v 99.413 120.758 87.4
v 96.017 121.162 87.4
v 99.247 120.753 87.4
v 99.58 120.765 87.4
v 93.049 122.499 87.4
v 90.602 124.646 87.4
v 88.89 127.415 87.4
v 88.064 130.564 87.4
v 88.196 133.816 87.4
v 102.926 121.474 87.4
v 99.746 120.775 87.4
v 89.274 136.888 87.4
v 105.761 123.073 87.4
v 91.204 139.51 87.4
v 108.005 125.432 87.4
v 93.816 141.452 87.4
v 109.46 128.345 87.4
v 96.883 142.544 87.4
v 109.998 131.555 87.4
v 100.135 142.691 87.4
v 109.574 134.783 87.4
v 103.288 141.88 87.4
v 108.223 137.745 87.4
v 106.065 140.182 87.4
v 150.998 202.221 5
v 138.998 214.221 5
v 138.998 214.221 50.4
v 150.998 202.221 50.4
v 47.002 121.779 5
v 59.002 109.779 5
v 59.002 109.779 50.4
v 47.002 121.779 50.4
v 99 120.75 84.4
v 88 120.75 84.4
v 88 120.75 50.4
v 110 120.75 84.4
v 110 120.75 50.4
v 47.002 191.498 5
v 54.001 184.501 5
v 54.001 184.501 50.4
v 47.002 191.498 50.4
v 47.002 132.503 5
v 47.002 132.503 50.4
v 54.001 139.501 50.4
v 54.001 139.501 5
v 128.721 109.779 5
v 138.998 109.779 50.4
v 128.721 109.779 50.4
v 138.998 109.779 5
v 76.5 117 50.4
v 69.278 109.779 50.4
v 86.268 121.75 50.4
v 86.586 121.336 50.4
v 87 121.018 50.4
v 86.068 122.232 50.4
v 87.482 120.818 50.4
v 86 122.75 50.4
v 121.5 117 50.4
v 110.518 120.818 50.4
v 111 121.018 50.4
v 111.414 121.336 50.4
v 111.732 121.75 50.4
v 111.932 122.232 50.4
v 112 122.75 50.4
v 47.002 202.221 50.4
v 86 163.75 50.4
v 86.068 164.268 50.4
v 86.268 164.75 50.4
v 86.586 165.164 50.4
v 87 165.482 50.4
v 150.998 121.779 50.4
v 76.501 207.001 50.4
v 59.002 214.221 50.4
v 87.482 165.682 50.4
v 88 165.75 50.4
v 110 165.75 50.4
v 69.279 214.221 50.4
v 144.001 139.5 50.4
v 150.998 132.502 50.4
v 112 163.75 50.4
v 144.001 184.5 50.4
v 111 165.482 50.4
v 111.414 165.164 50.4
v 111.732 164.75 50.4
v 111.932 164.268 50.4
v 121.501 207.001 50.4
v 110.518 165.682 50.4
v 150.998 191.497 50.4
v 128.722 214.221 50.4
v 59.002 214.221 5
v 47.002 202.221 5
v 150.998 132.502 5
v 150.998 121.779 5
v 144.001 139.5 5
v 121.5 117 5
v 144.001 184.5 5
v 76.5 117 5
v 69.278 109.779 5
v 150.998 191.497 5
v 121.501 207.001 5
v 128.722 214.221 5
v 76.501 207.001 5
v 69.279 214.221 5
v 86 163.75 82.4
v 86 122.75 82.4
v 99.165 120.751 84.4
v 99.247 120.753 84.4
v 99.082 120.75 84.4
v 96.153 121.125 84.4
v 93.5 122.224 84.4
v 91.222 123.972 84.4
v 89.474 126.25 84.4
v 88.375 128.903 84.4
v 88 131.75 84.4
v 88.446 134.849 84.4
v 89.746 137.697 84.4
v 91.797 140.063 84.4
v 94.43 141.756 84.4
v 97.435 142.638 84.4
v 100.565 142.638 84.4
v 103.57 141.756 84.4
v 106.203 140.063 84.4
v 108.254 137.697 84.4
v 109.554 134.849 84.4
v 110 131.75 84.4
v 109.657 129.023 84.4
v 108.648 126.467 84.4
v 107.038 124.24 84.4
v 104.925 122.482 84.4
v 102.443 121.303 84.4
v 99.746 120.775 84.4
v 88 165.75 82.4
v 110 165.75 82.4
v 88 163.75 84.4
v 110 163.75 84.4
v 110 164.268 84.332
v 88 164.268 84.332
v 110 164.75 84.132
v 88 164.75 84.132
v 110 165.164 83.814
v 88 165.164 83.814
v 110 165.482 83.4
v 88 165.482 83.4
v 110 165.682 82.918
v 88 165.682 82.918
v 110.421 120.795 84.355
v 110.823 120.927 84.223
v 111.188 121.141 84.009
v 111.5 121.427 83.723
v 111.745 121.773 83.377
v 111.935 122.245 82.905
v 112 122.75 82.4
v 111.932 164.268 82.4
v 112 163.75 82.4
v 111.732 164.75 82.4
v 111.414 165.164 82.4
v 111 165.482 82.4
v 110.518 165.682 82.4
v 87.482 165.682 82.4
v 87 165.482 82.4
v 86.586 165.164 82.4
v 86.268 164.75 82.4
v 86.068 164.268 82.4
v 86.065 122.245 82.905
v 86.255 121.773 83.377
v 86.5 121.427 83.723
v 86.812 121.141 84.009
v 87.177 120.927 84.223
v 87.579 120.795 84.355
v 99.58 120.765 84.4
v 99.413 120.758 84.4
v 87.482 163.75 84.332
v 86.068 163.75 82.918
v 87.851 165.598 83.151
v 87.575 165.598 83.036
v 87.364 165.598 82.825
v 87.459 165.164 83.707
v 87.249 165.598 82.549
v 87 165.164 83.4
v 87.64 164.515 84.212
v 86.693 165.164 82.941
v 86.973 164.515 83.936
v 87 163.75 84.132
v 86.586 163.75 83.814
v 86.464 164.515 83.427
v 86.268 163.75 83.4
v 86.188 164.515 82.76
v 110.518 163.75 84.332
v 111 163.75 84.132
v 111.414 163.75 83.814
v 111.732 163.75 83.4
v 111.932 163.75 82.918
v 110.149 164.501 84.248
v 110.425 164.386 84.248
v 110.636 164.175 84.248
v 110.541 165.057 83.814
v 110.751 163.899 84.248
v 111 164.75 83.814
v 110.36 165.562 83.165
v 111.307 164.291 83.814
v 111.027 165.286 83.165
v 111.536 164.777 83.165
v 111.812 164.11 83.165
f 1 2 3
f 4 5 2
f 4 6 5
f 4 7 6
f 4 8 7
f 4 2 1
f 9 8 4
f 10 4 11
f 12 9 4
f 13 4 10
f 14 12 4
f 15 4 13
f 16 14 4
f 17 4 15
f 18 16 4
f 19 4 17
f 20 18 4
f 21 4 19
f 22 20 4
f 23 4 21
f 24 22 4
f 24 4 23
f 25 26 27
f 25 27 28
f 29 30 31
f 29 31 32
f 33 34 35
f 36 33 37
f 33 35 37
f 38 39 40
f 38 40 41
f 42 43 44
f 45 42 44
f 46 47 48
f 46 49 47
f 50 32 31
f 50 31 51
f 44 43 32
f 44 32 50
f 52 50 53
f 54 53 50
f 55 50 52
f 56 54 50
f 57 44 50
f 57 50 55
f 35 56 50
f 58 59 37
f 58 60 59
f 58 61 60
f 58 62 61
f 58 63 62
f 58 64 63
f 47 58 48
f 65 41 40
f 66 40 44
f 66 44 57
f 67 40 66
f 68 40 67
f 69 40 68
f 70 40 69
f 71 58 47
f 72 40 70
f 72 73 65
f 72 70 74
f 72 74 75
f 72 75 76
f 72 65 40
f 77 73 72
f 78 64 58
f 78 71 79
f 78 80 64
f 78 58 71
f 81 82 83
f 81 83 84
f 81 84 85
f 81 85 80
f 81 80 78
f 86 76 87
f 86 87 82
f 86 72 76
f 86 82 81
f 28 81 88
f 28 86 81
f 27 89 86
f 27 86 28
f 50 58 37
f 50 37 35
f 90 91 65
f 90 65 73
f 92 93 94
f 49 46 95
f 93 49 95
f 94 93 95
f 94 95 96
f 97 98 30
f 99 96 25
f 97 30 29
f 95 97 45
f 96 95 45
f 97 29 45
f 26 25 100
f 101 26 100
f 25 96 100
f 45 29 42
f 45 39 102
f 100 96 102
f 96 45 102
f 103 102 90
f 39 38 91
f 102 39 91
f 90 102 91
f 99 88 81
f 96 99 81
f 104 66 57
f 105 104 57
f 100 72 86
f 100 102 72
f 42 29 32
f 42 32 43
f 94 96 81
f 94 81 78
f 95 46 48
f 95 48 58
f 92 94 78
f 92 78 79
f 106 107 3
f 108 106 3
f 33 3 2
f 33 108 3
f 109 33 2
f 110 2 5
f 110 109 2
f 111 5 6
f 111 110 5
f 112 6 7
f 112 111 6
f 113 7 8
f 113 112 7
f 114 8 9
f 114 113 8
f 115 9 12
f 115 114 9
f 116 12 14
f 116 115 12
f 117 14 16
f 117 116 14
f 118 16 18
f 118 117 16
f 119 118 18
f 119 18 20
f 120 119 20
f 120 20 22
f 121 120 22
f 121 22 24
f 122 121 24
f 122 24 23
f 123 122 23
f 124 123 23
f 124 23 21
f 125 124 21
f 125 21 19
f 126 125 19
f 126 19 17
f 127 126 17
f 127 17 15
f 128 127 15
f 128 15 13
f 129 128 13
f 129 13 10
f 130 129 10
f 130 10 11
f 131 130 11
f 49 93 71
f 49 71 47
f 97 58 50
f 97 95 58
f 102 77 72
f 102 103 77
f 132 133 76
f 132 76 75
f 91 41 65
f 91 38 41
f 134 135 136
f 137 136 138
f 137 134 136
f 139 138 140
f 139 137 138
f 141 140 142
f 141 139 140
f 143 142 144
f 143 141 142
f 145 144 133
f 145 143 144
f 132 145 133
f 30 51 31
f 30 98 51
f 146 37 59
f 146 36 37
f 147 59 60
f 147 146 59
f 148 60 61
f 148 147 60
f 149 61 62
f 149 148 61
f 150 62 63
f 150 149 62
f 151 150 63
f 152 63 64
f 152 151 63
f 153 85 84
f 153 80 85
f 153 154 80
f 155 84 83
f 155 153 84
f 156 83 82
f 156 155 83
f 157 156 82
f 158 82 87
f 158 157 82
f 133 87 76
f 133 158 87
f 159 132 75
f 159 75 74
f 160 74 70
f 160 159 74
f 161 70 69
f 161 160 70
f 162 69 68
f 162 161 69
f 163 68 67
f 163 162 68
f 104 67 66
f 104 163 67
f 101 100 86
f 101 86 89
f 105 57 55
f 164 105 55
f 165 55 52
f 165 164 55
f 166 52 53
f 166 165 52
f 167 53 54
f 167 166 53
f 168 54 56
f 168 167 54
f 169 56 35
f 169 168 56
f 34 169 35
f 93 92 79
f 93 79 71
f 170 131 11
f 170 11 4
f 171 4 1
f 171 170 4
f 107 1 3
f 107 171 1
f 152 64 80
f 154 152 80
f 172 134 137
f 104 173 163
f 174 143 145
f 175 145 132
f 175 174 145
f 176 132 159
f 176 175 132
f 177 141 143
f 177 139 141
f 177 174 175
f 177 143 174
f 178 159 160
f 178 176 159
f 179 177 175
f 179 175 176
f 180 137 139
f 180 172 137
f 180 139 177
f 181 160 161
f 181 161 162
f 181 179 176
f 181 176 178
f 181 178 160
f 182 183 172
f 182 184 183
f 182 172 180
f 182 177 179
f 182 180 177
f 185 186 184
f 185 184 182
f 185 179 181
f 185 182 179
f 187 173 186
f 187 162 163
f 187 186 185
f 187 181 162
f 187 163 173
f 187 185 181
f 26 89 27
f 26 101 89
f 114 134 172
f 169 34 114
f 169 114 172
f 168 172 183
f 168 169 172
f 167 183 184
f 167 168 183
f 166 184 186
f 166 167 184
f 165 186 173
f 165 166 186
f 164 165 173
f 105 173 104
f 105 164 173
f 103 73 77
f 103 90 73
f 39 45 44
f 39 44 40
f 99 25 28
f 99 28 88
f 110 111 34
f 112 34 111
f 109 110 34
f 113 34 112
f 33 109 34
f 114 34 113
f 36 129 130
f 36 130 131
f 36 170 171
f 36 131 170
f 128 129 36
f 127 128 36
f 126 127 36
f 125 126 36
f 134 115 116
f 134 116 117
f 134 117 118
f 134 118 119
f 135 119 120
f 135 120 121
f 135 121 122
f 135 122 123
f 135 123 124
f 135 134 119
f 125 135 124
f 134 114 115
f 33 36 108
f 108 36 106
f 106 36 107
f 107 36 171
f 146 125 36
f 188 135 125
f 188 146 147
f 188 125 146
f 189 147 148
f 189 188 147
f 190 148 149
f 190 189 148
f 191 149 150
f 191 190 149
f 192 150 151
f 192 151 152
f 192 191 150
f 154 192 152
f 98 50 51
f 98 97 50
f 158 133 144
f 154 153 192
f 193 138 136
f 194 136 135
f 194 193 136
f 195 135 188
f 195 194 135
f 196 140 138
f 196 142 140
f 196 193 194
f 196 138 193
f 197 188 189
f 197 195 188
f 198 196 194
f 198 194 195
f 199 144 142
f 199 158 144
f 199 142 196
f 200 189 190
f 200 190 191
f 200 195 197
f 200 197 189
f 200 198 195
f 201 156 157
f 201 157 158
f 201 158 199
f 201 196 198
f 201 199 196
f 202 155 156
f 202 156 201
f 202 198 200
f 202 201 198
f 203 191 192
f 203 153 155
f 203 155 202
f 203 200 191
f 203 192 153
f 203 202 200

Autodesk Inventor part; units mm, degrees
ref_plane "YZ Plane" through (0, 0, 0) normal (1, 0, 0) x (0, 1, 0)
ref_plane "XZ Plane" through (0, 0, 0) normal (0, 1, 0) x (-1, 0, 0)
ref_plane "XY Plane" through (0, 0, 0) normal (0, 0, 1) x (1, 0, 0)
sketch "Sketch1" plane through (0, 0, 0) normal (0, 0, 1) x (1, 0, 0)
  line L0 (87.39809, 90.638849) -> (76.791489, 101.245451)
  line L1 (110.603697, 90.638591) -> (87.39809, 90.638849)
  line L2 (121.210063, 101.244956) -> (110.603697, 90.638591)
  line L3 (143.419374, 101.244709) -> (121.210063, 101.244956)
  line L4 (153.419263, 111.244598) -> (143.419374, 101.244709)
  line L5 (153.419473, 130.081843) -> (153.419263, 111.244598)
  line L6 (144.001258, 139.500058) -> (153.419473, 130.081843)
  line L7 (144.001258, 184.500058) -> (144.001258, 139.500058)
  line L8 (162.838724, 203.336883) -> (144.001258, 184.500058)
  line L9 (174.479779, 203.336684) -> (162.838724, 203.336883)
  line L10 (188.623093, 217.476415) -> (174.479779, 203.336684)
  line L11 (188.623904, 237.476415) -> (188.623093, 217.476415)
  line L12 (174.481567, 251.622561) -> (188.623904, 237.476415)
  line L13 (154.481567, 251.622902) -> (174.481567, 251.622561)
  line L14 (140.33919, 237.481007) -> (154.481567, 251.622902)
  line L15 (140.338992, 225.83779) -> (140.33919, 237.481007)
  line L16 (121.502223, 207.001664) -> (140.338992, 225.83779)
  line L17 (76.502223, 207.001664) -> (121.502223, 207.001664)
  line L18 (57.665842, 225.839164) -> (76.502223, 207.001664)
  line L19 (57.66604, 237.480627) -> (57.665842, 225.839164)
  line L20 (43.524145, 251.623004) -> (57.66604, 237.480627)
  line L21 (23.524145, 251.623344) -> (43.524145, 251.623004)
  line L22 (9.381769, 237.48145) -> (23.524145, 251.623344)
  line L23 (9.380958, 217.48145) -> (9.381769, 237.48145)
  line L24 (23.52252, 203.338741) -> (9.380958, 217.48145)
  line L25 (35.165328, 203.338269) -> (23.52252, 203.338741)
  line L26 (54.001421, 184.501058) -> (35.165328, 203.338269)
  line L27 (54.001421, 139.501058) -> (54.001421, 184.501058)
  line L28 (44.582671, 130.082867) -> (54.001421, 139.501058)
  line L29 (44.582461, 111.245809) -> (44.582671, 130.082867)
  line L30 (54.582226, 101.245698) -> (44.582461, 111.245809)
  line L31 (76.791489, 101.245451) -> (54.582226, 101.245698)
  circle A0 centre (99, 132) radius 5.5
  arc A1 (130.06, 142) -> (135.06, 142) centre (132.56, 142) ccw
  line L32 (130.06, 142) -> (130.06, 182)
  line L33 (135.06, 182) -> (135.06, 142)
  arc A2 (62.940969, 142) -> (67.940969, 142) centre (65.440969, 142) ccw
  arc A3 (67.940969, 182) -> (62.940969, 182) centre (65.440969, 182) ccw
  line L34 (67.940969, 182) -> (67.940969, 142)
  line L35 (138.997508, 214.221497) -> (150.997508, 202.221497)
  line L36 (128.721743, 214.221497) -> (138.997508, 214.221497)
  line L37 (121.5, 207) -> (128.721743, 214.221497)
  line L38 (76.5, 207) -> (121.5, 207)
  line L39 (69.278592, 214.221497) -> (76.5, 207)
  line L40 (59.002492, 214.221497) -> (69.278592, 214.221497)
  line L41 (47.002492, 202.221497) -> (59.002492, 214.221497)
  line L42 (47.002492, 191.497594) -> (47.002492, 202.221497)
  line L43 (54, 184.5) -> (47.002492, 191.497594)
  line L44 (54, 139.5) -> (54, 184.5)
  line L45 (47.002492, 132.502579) -> (54, 139.5)
  line L46 (47.002492, 121.778503) -> (47.002492, 132.502579)
  line L47 (59.002492, 109.778503) -> (47.002492, 121.778503)
  line L48 (69.278414, 109.778503) -> (59.002492, 109.778503)
  line L49 (76.5, 117) -> (69.278414, 109.778503)
  line L50 (121.5, 117) -> (76.5, 117)
  line L51 (128.721408, 109.778503) -> (121.5, 117)
  line L52 (138.997508, 109.778503) -> (128.721408, 109.778503)
  line L53 (150.997508, 121.778503) -> (138.997508, 109.778503)
  line L54 (150.997508, 132.502406) -> (150.997508, 121.778503)
  line L55 (144, 139.5) -> (150.997508, 132.502406)
  line L56 (144, 184.5) -> (144, 139.5)
  line L57 (150.997508, 191.497269) -> (144, 184.5)
  line L58 (150.997508, 202.221497) -> (150.997508, 191.497269)
  arc A4 (99.74629, 120.775345) -> (99.246799, 120.752769) centre (99, 131.75) ccw
  line L59 (111.585786, 133.75) -> (111, 133.75)
  line L60 (111.585786, 133.75) -> (111.585786, 135.25)
  line L61 (111.585786, 135.25) -> (113.5, 135.25)
  line L62 (113.5, 135.45) -> (113.5, 135.25)
  line L63 (113.5, 135.45) -> (113.917157, 135.45)
  line L64 (113.917157, 135.45) -> (113.917157, 141.55)
  line L65 (110.05, 169.167157) -> (103.95, 169.167157)
  line L66 (103.95, 169.167157) -> (103.95, 166.667157)
  line L67 (103.95, 166.667157) -> (94.05, 166.667157)
  line L68 (94.05, 166.667157) -> (94.05, 169.167157)
  line L69 (87.95, 169.167157) -> (87.95, 168.75)
  line L70 (87.95, 168.75) -> (87.5, 168.75)
  line L71 (86.414214, 135.25) -> (84.5, 135.25)
  line L72 (86.414214, 135.25) -> (86.414214, 133.75)
  line L73 (86.414214, 133.75) -> (87, 133.75)
  line L74 (87, 133.75) -> (87, 125.5)
  line L75 (87, 125.5) -> (89, 125.5)
  line L76 (109, 125.5) -> (111, 125.5)
  line L77 (111, 125.5) -> (111, 133.75)
  line L78 (85, 136.25) -> (86, 136.25)
  line L79 (86, 136.25) -> (86, 137.354356)
  line L80 (104.686492, 167.25) -> (104.686492, 168.25)
  line L81 (104.686492, 168.25) -> (105.854356, 168.25)
  line L82 (105.854356, 167.25) -> (104.686492, 167.25)
  circle A5 centre (99, 131.75) radius 11
  point P0 (0, 0)
  point P1 (0, 0)
extrude "Extrusion1" add sketch "Sketch1" along normal blind 5 contours L0 L31 L30 L29 L28 L46 L47 L48 L49 L50 L51 L52 L53 L54 L6 L5 L4 L3 L2 L1 | L28 L27 L26 L42 L41 L40 L39 L17 L16 L36 L35 L58 L8 L7 L6 L54 L53 L52 L51 L50 L49 L48 L47 L46 | L26 L25 L24 L23 L22 L21 L20 L19 L18 L39 L40 L41 L42 | L58 L35 L36 L16 L15 L14 L13 L12 L11 L10 L9 L8 | A0 | A5 A4
extrude "Extrusion2" add sketch "Sketch1" along normal blind 50.4 contours L28 L27 L26 L42 L41 L40 L39 L17 L16 L36 L35 L58 L8 L7 L6 L54 L53 L52 L51 L50 L49 L48 L47 L46 | A0 | A5 A4
extrude "Extrusion3" add sketch "Sketch1" along normal blind 87.4 contours A0 | A5 A4
sketch "Sketch2" plane through (0, 0, 50.4) normal (0, 0, 1) x (1, 0, 0)
  circle A0 centre (99, 131.75) radius 11 projected
  line L0 (144, 184.5) -> (144, 139.5) projected
  line L1 (99, 120.75) -> (112, 120.75)
  line L2 (112, 120.75) -> (112, 165.75)
  line L3 (112, 165.75) -> (86, 165.75)
  line L4 (86, 165.75) -> (86, 120.75)
  line L5 (86, 120.75) -> (99, 120.75)
  point P0 (0, 0)
  dimension "d6" = 13
  dimension "d7" = 45
  dimension "d8" = 26
extrude "Extrusion4" add sketch "Sketch2" along normal blind 34
fillet "Fillet1" radius 2 7 edges at (112, 165.75, 67.4) (112, 143.25, 84.4) (112, 120.75, 67.4) (86, 120.75, 67.4) (86, 143.25, 84.4) (99, 165.75, 84.4) (86, 165.75, 67.4)
sketch "Sketch3" plane through (150.997508, 191.497269, 5) normal (1, 0, 0) x (0, 0, -1)
  line L0 (0, 10.724228) -> (0, 0)
  line L1 (0, 0) -> (-45.4, 0)
  line L2 (0, 10.724228) -> (0, 62.129515)
  line L3 (0, 62.129515) -> (15.429551, 62.129515)
  line L4 (15.429551, 62.129515) -> (15.429551, -102.504069)
  line L5 (15.429551, -102.504069) -> (0, -102.504069)
  line L6 (0, -102.504069) -> (0, 10.724228)
  point P0 (5, -191.497269)
extrude "Extrusion5" cut sketch "Sketch3" along normal through all both and the other way through all
properties part number "Base_NOBOTTOMPLATE"
